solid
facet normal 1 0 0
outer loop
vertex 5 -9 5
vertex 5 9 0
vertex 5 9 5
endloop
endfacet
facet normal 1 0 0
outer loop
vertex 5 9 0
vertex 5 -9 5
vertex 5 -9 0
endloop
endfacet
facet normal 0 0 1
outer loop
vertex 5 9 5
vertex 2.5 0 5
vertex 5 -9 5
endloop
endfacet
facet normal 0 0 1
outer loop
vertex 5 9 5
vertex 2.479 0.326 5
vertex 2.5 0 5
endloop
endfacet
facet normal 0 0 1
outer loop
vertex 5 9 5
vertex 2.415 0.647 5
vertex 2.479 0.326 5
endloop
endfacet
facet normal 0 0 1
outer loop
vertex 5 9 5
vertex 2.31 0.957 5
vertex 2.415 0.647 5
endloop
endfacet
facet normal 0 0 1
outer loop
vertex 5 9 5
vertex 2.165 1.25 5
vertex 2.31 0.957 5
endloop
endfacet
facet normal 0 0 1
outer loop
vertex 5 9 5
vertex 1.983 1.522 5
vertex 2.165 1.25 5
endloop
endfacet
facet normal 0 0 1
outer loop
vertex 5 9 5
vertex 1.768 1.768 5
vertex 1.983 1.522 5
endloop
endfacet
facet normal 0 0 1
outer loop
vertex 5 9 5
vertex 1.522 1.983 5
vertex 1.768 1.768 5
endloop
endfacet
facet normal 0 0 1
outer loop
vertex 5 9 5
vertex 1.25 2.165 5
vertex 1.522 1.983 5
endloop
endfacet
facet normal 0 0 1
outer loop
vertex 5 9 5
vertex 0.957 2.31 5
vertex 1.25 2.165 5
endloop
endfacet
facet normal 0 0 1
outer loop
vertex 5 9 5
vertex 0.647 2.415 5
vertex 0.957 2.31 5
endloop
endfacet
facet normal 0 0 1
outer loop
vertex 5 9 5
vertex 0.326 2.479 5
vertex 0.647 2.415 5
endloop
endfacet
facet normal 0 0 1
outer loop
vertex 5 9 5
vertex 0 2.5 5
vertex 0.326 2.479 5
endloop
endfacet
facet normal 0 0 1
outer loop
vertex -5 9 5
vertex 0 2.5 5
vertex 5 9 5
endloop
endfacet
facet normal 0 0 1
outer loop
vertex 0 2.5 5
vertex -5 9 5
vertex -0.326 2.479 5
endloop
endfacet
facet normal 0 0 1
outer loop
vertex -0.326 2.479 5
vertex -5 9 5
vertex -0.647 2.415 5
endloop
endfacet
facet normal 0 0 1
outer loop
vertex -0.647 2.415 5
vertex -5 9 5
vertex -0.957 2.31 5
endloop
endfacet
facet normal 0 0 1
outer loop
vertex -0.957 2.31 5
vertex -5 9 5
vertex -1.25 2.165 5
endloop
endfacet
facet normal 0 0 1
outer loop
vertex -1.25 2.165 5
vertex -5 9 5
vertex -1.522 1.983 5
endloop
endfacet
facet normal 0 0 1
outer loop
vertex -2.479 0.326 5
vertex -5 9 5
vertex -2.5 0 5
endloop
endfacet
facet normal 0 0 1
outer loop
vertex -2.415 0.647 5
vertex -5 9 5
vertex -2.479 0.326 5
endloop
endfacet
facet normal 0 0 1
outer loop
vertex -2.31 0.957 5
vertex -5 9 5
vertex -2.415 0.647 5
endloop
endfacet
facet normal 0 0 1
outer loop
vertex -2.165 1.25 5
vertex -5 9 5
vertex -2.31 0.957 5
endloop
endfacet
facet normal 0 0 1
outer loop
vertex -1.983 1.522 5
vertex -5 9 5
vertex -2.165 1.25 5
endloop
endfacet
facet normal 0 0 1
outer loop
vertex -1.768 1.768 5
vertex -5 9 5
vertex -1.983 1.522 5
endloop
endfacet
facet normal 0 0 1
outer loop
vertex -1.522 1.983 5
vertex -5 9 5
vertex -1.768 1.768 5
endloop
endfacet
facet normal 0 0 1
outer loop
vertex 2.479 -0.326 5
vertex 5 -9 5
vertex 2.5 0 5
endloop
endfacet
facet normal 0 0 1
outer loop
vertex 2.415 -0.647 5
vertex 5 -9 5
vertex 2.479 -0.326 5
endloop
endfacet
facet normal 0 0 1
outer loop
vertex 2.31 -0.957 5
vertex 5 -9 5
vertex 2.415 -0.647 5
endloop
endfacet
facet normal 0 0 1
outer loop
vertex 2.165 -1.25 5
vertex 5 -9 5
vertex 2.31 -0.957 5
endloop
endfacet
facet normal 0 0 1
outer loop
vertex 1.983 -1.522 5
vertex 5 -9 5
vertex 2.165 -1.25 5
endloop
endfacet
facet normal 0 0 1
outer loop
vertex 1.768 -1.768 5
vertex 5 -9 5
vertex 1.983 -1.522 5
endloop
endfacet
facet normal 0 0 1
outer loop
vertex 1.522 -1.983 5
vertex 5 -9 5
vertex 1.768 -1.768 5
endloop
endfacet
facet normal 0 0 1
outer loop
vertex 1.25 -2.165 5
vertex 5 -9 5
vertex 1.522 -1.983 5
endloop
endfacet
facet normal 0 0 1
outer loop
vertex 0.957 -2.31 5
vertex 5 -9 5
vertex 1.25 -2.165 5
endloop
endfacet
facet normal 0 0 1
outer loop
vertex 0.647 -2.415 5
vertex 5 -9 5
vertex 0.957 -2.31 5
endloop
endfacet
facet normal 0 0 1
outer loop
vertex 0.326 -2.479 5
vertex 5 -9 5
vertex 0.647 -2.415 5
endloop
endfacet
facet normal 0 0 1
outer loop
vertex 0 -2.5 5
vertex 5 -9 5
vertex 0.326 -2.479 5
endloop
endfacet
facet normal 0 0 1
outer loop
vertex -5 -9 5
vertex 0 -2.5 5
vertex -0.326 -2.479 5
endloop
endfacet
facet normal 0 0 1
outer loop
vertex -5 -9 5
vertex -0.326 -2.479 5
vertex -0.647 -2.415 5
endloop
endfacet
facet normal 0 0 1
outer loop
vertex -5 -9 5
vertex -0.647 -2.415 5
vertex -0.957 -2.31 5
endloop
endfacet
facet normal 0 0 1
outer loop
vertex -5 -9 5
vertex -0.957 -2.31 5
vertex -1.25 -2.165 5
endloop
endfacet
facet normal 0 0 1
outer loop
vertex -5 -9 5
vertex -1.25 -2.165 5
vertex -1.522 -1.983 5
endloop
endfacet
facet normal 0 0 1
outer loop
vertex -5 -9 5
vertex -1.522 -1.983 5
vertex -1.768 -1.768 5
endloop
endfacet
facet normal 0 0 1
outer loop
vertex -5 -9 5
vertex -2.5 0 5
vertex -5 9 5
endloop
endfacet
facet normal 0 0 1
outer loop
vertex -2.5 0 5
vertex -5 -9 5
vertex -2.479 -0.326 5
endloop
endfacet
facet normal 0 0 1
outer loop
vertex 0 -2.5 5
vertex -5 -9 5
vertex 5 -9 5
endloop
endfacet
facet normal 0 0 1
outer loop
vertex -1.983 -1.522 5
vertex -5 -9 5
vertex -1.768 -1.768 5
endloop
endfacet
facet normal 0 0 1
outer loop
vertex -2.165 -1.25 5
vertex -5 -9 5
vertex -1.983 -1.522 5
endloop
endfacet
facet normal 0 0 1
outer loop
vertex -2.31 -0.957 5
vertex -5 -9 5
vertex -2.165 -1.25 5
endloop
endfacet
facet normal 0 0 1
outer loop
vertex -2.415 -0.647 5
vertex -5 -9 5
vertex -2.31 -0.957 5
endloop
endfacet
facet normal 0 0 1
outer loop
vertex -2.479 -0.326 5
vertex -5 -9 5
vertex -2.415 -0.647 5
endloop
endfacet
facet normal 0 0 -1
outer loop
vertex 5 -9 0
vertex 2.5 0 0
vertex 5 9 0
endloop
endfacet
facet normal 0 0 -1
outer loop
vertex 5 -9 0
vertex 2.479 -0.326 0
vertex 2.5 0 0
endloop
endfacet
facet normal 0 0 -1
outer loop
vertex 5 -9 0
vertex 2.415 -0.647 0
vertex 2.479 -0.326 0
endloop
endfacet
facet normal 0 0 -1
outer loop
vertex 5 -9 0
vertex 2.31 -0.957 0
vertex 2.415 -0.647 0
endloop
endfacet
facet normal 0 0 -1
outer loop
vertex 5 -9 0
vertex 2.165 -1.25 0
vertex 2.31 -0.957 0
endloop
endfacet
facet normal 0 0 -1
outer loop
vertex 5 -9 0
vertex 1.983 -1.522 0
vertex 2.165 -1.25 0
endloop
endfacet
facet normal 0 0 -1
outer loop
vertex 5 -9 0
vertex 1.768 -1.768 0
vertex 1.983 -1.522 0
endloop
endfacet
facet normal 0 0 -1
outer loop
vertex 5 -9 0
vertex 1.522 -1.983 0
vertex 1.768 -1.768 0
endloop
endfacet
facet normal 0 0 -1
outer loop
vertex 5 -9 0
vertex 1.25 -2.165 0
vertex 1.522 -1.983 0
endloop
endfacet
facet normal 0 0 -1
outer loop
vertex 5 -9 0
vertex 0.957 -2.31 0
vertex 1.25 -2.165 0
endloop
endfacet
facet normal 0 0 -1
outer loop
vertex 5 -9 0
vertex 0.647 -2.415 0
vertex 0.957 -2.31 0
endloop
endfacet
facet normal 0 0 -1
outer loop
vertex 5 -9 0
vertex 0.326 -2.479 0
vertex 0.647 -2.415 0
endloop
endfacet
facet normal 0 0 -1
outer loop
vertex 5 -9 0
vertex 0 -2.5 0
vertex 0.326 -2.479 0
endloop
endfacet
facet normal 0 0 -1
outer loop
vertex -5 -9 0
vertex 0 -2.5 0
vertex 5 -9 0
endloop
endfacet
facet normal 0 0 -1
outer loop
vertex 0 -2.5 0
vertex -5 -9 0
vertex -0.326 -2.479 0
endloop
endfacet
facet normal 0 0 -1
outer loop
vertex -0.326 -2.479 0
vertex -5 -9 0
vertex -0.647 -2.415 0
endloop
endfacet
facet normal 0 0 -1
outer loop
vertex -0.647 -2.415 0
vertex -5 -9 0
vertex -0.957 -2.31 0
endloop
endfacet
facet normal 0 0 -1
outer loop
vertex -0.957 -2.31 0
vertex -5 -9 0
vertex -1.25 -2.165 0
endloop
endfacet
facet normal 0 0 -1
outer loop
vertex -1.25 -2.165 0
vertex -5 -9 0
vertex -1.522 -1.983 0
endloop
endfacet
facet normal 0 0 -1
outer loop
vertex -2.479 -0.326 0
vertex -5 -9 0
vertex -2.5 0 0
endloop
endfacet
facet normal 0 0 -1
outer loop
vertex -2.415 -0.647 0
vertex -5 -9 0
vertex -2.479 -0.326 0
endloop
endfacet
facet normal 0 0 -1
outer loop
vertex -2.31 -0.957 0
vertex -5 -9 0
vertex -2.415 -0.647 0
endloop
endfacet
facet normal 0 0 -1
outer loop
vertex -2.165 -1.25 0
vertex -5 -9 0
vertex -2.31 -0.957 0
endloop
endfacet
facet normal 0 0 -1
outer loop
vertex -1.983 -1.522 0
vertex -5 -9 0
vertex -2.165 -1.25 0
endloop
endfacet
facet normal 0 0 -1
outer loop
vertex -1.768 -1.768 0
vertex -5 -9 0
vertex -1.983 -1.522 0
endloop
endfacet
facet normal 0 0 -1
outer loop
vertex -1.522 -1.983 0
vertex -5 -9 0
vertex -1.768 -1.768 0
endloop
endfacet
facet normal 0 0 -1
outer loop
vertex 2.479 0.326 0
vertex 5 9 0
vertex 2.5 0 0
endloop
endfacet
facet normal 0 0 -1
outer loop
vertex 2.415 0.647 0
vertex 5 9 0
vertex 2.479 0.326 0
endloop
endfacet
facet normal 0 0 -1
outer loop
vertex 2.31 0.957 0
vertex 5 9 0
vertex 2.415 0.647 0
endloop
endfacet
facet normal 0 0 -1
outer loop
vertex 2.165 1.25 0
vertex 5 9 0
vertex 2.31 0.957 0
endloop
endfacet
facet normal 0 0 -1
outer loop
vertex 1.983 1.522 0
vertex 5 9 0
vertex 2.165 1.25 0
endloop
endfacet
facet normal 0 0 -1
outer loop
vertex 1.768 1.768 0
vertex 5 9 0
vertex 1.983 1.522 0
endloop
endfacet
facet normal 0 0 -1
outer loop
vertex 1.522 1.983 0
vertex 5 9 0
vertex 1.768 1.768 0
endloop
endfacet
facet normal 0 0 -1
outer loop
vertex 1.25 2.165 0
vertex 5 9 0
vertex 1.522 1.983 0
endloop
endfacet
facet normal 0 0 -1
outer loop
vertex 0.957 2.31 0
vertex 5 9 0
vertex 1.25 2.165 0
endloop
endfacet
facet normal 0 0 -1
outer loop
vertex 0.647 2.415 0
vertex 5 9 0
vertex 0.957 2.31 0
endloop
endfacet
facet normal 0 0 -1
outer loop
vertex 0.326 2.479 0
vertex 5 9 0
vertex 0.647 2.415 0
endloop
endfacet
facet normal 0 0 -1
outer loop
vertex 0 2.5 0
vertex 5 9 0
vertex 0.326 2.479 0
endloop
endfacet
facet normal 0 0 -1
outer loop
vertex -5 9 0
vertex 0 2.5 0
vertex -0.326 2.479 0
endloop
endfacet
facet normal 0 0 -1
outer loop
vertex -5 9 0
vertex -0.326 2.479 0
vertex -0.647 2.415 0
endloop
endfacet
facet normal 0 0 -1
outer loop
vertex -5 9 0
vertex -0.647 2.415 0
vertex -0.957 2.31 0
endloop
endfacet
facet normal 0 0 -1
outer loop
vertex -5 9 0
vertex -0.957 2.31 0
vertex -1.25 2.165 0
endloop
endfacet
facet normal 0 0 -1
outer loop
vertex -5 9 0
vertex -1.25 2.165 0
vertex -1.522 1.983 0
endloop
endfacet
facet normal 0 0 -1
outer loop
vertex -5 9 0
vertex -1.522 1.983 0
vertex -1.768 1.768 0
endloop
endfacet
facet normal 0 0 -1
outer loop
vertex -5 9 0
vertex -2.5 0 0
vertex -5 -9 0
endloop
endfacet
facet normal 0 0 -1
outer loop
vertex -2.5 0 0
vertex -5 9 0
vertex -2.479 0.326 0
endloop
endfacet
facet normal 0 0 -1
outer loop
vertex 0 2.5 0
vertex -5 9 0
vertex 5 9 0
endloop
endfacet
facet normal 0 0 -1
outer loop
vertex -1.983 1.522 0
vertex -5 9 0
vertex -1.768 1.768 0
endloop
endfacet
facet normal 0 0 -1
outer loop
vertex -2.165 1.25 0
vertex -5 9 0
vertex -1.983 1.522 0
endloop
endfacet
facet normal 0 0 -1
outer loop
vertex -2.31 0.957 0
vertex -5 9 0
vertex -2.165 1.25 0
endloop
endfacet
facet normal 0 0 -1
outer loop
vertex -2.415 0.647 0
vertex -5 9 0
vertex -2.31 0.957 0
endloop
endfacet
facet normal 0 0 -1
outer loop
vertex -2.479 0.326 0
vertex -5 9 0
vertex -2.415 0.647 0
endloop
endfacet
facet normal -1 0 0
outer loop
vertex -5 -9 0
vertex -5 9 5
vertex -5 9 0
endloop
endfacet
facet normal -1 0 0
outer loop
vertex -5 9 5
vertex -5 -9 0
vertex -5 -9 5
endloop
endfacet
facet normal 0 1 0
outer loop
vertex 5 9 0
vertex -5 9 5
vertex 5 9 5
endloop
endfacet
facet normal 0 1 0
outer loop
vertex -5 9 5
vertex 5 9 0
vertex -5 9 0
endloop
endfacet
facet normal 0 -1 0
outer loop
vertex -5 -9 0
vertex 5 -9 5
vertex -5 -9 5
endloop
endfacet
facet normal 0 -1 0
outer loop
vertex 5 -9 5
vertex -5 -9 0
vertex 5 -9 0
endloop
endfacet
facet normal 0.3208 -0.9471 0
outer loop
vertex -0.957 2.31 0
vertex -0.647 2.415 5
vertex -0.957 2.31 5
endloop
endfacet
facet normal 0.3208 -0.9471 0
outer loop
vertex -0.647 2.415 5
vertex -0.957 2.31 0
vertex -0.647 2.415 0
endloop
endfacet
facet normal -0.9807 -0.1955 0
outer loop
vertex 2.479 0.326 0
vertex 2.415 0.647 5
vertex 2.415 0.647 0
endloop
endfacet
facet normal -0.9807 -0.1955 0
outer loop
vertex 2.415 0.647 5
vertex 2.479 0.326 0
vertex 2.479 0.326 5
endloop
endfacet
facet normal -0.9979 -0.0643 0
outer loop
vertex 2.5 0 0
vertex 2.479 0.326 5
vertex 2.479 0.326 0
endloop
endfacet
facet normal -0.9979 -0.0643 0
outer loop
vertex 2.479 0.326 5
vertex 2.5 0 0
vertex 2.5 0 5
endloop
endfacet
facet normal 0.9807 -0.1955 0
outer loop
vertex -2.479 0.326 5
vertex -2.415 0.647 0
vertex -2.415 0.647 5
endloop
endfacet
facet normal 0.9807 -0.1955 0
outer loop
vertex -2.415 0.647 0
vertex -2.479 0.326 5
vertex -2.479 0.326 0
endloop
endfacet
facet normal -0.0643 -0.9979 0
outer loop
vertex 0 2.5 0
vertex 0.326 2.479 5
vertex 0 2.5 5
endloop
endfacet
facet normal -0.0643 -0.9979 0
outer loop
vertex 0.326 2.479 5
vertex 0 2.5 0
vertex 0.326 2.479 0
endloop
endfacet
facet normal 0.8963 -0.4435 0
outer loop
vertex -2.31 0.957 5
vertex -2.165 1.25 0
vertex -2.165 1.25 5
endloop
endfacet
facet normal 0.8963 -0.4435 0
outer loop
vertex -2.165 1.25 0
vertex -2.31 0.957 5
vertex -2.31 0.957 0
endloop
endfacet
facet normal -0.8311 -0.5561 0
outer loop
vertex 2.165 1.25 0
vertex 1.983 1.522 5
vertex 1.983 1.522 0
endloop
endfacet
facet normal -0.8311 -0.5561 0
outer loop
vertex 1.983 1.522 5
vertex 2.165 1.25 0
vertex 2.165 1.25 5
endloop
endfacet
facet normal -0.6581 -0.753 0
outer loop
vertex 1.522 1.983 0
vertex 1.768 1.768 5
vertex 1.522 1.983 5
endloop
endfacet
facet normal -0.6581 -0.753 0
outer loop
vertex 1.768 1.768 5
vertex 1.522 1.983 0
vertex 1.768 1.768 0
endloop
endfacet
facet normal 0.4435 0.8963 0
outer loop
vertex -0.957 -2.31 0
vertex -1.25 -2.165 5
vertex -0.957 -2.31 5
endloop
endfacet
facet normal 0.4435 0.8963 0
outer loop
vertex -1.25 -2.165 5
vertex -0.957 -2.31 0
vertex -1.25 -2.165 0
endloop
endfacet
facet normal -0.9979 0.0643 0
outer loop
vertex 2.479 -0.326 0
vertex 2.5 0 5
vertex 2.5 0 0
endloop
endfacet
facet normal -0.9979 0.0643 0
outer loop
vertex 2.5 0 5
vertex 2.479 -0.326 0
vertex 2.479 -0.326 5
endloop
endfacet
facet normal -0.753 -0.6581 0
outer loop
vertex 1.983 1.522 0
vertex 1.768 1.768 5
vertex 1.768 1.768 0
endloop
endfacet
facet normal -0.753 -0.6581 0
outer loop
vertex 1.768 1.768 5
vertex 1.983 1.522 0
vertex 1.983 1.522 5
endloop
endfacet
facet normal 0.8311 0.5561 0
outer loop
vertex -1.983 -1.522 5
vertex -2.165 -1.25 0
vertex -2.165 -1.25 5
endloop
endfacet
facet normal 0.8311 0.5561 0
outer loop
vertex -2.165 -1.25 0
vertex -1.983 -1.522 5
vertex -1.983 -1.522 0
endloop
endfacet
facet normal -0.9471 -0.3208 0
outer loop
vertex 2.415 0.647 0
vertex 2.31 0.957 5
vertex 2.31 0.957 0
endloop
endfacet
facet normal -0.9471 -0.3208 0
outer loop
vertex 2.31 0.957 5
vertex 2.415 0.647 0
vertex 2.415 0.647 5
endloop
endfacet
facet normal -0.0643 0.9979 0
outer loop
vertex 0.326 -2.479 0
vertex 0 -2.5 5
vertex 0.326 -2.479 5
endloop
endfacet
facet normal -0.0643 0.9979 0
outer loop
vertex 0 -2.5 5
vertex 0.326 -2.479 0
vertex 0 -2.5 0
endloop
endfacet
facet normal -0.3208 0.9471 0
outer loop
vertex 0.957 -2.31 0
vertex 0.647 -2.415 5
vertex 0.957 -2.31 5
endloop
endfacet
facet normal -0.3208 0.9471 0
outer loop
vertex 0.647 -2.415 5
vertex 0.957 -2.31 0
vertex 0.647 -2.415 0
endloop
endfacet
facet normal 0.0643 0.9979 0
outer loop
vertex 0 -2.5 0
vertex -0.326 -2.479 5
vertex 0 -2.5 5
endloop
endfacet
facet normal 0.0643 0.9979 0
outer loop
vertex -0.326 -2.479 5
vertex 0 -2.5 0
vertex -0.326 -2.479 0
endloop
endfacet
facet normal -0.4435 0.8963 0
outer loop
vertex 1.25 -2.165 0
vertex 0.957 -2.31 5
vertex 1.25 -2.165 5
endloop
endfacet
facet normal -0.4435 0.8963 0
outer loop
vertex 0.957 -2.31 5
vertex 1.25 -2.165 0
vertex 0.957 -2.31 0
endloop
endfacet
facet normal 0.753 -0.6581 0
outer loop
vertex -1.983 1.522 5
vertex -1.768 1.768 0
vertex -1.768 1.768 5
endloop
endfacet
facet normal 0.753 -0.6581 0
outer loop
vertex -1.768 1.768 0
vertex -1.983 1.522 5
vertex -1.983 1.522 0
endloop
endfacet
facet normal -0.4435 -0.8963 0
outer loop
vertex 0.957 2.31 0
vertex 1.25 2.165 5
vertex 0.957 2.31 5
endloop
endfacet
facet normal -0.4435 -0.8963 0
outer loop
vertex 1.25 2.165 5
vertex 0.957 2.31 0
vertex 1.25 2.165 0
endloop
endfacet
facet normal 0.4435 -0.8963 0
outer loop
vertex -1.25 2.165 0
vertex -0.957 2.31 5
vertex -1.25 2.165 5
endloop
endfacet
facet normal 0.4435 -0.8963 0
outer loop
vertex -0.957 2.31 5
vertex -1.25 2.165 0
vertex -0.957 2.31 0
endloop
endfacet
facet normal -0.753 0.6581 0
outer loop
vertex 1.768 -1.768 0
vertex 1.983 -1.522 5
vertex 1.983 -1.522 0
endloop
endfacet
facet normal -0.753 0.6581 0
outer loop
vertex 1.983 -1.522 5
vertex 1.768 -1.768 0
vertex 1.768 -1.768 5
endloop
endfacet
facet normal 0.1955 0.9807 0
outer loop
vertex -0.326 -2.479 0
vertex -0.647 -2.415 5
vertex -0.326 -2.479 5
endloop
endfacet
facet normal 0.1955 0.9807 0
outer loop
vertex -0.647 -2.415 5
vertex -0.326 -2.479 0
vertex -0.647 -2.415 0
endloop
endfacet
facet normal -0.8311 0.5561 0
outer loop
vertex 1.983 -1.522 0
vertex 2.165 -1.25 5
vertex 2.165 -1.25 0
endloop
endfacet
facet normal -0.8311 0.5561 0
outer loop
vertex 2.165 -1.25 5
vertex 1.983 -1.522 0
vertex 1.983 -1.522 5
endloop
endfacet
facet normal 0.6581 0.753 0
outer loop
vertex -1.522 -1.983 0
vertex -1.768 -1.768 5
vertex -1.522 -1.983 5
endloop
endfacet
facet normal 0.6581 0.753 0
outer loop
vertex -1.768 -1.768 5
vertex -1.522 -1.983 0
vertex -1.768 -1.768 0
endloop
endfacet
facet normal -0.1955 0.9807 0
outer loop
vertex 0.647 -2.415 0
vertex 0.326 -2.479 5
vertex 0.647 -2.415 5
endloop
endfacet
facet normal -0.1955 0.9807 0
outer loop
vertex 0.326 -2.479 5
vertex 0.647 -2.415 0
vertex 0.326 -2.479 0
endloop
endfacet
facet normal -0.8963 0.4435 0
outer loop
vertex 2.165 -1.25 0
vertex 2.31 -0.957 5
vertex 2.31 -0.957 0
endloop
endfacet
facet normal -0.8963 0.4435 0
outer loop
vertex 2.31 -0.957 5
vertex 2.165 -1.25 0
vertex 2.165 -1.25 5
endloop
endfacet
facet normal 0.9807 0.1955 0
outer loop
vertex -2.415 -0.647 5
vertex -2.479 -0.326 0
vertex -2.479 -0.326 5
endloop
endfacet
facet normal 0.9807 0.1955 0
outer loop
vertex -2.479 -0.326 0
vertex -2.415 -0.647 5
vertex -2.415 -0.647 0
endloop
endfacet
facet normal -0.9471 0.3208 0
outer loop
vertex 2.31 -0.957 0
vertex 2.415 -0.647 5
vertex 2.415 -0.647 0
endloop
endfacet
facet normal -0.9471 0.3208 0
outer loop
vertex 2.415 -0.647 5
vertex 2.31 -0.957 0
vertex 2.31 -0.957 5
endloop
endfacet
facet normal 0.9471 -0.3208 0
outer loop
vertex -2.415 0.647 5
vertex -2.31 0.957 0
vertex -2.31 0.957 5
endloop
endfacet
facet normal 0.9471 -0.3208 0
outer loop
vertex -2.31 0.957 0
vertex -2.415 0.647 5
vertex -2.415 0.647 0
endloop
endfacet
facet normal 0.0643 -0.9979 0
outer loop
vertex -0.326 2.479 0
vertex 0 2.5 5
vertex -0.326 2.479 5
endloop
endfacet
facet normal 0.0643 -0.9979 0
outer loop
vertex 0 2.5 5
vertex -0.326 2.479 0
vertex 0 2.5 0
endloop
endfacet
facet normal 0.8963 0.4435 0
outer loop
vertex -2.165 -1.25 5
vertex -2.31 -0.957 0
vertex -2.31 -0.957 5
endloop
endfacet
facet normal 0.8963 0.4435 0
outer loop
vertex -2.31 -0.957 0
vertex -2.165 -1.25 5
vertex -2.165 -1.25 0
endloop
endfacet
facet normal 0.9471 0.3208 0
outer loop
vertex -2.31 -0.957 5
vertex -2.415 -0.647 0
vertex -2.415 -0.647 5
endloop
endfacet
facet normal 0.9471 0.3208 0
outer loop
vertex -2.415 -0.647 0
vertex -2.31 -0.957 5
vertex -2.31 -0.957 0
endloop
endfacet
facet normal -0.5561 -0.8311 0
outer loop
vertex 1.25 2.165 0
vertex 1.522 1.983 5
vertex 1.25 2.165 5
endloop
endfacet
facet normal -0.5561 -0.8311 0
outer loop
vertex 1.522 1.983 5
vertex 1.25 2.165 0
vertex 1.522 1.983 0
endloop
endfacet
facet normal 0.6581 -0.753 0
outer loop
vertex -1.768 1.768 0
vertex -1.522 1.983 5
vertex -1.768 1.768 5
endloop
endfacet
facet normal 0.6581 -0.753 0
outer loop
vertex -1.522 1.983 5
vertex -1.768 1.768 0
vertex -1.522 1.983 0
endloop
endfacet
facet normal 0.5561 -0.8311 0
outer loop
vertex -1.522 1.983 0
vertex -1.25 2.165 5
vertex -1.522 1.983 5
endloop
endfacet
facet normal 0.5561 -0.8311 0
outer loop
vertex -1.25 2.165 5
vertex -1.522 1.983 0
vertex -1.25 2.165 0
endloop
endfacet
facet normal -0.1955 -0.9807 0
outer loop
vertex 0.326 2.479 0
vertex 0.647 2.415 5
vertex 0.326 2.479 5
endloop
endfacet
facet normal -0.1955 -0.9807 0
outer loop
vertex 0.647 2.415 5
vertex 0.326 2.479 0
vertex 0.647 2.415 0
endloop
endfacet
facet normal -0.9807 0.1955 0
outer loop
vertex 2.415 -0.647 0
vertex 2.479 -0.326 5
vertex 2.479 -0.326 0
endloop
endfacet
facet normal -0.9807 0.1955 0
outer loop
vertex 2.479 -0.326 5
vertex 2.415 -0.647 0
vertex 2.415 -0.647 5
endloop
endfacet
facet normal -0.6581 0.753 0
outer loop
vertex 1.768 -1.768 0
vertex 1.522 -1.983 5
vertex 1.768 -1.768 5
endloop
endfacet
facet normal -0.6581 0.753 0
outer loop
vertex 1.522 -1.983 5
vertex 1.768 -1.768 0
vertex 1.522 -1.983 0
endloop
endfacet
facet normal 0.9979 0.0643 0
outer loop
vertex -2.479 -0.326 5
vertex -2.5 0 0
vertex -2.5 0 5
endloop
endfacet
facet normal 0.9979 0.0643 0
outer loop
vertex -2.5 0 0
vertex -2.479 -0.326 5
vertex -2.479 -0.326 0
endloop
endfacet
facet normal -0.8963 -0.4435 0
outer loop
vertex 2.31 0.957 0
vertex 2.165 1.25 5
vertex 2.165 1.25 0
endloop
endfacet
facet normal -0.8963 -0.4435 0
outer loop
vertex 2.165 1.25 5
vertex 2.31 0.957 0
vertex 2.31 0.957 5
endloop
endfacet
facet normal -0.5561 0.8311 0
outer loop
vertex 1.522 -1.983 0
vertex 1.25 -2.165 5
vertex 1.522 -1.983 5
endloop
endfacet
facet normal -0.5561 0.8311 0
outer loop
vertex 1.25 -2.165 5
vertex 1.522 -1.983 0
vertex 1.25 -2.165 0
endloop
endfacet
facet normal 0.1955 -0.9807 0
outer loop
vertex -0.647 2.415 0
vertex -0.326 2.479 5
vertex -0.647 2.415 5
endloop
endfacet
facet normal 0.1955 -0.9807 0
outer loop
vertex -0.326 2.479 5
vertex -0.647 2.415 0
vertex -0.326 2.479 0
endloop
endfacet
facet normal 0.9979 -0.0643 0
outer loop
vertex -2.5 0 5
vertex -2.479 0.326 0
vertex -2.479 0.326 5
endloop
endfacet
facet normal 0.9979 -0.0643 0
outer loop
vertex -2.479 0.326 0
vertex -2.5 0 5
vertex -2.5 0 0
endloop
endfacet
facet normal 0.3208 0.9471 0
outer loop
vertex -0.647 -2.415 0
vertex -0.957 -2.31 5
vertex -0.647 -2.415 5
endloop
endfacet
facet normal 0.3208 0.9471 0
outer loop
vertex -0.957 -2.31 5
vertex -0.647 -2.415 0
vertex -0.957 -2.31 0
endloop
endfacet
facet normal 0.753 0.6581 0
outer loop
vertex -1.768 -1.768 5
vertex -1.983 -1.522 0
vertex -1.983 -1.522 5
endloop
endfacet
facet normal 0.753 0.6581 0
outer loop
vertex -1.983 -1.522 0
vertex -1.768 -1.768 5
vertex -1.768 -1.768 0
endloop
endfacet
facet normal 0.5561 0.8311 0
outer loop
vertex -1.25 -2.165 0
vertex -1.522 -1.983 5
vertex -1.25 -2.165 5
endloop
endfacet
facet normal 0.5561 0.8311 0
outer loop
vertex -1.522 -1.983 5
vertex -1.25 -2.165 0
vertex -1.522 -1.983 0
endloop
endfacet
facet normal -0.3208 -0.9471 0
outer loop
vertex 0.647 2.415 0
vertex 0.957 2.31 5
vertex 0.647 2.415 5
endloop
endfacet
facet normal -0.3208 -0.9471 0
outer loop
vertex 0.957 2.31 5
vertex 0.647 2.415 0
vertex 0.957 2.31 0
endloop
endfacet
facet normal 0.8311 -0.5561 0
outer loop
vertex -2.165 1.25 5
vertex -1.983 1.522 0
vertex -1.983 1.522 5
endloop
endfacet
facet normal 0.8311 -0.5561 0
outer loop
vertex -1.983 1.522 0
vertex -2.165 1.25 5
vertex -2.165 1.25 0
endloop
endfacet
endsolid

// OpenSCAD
// Channel / T-slot nut - a rectangular block with a bolt bore, for aluminium extrusion or a
// slotted channel. NOVEL general part.
//
// @desc rectangular channel nut with a bolt bore
// @prompt Design a channel nut in OpenSCAD: a block {w} mm wide, {l} mm long and {h} mm thick with a {bore} mm bore through it for a bolt. Reply with a single complete OpenSCAD file.
// @param w    width, mm          [8:16]
// @param l    length, mm         [10:25]
// @param h    thickness, mm      [3:8]
// @param bore bore diameter, mm  [3:8]

w    = 10;
l    = 18;
h    = 5;
bore = 5;

$fn = 48;

difference() {
    translate([-w / 2, -l / 2, 0]) cube([w, l, h]);
    translate([0, 0, -1]) cylinder(h = h + 2, d = bore);
}
